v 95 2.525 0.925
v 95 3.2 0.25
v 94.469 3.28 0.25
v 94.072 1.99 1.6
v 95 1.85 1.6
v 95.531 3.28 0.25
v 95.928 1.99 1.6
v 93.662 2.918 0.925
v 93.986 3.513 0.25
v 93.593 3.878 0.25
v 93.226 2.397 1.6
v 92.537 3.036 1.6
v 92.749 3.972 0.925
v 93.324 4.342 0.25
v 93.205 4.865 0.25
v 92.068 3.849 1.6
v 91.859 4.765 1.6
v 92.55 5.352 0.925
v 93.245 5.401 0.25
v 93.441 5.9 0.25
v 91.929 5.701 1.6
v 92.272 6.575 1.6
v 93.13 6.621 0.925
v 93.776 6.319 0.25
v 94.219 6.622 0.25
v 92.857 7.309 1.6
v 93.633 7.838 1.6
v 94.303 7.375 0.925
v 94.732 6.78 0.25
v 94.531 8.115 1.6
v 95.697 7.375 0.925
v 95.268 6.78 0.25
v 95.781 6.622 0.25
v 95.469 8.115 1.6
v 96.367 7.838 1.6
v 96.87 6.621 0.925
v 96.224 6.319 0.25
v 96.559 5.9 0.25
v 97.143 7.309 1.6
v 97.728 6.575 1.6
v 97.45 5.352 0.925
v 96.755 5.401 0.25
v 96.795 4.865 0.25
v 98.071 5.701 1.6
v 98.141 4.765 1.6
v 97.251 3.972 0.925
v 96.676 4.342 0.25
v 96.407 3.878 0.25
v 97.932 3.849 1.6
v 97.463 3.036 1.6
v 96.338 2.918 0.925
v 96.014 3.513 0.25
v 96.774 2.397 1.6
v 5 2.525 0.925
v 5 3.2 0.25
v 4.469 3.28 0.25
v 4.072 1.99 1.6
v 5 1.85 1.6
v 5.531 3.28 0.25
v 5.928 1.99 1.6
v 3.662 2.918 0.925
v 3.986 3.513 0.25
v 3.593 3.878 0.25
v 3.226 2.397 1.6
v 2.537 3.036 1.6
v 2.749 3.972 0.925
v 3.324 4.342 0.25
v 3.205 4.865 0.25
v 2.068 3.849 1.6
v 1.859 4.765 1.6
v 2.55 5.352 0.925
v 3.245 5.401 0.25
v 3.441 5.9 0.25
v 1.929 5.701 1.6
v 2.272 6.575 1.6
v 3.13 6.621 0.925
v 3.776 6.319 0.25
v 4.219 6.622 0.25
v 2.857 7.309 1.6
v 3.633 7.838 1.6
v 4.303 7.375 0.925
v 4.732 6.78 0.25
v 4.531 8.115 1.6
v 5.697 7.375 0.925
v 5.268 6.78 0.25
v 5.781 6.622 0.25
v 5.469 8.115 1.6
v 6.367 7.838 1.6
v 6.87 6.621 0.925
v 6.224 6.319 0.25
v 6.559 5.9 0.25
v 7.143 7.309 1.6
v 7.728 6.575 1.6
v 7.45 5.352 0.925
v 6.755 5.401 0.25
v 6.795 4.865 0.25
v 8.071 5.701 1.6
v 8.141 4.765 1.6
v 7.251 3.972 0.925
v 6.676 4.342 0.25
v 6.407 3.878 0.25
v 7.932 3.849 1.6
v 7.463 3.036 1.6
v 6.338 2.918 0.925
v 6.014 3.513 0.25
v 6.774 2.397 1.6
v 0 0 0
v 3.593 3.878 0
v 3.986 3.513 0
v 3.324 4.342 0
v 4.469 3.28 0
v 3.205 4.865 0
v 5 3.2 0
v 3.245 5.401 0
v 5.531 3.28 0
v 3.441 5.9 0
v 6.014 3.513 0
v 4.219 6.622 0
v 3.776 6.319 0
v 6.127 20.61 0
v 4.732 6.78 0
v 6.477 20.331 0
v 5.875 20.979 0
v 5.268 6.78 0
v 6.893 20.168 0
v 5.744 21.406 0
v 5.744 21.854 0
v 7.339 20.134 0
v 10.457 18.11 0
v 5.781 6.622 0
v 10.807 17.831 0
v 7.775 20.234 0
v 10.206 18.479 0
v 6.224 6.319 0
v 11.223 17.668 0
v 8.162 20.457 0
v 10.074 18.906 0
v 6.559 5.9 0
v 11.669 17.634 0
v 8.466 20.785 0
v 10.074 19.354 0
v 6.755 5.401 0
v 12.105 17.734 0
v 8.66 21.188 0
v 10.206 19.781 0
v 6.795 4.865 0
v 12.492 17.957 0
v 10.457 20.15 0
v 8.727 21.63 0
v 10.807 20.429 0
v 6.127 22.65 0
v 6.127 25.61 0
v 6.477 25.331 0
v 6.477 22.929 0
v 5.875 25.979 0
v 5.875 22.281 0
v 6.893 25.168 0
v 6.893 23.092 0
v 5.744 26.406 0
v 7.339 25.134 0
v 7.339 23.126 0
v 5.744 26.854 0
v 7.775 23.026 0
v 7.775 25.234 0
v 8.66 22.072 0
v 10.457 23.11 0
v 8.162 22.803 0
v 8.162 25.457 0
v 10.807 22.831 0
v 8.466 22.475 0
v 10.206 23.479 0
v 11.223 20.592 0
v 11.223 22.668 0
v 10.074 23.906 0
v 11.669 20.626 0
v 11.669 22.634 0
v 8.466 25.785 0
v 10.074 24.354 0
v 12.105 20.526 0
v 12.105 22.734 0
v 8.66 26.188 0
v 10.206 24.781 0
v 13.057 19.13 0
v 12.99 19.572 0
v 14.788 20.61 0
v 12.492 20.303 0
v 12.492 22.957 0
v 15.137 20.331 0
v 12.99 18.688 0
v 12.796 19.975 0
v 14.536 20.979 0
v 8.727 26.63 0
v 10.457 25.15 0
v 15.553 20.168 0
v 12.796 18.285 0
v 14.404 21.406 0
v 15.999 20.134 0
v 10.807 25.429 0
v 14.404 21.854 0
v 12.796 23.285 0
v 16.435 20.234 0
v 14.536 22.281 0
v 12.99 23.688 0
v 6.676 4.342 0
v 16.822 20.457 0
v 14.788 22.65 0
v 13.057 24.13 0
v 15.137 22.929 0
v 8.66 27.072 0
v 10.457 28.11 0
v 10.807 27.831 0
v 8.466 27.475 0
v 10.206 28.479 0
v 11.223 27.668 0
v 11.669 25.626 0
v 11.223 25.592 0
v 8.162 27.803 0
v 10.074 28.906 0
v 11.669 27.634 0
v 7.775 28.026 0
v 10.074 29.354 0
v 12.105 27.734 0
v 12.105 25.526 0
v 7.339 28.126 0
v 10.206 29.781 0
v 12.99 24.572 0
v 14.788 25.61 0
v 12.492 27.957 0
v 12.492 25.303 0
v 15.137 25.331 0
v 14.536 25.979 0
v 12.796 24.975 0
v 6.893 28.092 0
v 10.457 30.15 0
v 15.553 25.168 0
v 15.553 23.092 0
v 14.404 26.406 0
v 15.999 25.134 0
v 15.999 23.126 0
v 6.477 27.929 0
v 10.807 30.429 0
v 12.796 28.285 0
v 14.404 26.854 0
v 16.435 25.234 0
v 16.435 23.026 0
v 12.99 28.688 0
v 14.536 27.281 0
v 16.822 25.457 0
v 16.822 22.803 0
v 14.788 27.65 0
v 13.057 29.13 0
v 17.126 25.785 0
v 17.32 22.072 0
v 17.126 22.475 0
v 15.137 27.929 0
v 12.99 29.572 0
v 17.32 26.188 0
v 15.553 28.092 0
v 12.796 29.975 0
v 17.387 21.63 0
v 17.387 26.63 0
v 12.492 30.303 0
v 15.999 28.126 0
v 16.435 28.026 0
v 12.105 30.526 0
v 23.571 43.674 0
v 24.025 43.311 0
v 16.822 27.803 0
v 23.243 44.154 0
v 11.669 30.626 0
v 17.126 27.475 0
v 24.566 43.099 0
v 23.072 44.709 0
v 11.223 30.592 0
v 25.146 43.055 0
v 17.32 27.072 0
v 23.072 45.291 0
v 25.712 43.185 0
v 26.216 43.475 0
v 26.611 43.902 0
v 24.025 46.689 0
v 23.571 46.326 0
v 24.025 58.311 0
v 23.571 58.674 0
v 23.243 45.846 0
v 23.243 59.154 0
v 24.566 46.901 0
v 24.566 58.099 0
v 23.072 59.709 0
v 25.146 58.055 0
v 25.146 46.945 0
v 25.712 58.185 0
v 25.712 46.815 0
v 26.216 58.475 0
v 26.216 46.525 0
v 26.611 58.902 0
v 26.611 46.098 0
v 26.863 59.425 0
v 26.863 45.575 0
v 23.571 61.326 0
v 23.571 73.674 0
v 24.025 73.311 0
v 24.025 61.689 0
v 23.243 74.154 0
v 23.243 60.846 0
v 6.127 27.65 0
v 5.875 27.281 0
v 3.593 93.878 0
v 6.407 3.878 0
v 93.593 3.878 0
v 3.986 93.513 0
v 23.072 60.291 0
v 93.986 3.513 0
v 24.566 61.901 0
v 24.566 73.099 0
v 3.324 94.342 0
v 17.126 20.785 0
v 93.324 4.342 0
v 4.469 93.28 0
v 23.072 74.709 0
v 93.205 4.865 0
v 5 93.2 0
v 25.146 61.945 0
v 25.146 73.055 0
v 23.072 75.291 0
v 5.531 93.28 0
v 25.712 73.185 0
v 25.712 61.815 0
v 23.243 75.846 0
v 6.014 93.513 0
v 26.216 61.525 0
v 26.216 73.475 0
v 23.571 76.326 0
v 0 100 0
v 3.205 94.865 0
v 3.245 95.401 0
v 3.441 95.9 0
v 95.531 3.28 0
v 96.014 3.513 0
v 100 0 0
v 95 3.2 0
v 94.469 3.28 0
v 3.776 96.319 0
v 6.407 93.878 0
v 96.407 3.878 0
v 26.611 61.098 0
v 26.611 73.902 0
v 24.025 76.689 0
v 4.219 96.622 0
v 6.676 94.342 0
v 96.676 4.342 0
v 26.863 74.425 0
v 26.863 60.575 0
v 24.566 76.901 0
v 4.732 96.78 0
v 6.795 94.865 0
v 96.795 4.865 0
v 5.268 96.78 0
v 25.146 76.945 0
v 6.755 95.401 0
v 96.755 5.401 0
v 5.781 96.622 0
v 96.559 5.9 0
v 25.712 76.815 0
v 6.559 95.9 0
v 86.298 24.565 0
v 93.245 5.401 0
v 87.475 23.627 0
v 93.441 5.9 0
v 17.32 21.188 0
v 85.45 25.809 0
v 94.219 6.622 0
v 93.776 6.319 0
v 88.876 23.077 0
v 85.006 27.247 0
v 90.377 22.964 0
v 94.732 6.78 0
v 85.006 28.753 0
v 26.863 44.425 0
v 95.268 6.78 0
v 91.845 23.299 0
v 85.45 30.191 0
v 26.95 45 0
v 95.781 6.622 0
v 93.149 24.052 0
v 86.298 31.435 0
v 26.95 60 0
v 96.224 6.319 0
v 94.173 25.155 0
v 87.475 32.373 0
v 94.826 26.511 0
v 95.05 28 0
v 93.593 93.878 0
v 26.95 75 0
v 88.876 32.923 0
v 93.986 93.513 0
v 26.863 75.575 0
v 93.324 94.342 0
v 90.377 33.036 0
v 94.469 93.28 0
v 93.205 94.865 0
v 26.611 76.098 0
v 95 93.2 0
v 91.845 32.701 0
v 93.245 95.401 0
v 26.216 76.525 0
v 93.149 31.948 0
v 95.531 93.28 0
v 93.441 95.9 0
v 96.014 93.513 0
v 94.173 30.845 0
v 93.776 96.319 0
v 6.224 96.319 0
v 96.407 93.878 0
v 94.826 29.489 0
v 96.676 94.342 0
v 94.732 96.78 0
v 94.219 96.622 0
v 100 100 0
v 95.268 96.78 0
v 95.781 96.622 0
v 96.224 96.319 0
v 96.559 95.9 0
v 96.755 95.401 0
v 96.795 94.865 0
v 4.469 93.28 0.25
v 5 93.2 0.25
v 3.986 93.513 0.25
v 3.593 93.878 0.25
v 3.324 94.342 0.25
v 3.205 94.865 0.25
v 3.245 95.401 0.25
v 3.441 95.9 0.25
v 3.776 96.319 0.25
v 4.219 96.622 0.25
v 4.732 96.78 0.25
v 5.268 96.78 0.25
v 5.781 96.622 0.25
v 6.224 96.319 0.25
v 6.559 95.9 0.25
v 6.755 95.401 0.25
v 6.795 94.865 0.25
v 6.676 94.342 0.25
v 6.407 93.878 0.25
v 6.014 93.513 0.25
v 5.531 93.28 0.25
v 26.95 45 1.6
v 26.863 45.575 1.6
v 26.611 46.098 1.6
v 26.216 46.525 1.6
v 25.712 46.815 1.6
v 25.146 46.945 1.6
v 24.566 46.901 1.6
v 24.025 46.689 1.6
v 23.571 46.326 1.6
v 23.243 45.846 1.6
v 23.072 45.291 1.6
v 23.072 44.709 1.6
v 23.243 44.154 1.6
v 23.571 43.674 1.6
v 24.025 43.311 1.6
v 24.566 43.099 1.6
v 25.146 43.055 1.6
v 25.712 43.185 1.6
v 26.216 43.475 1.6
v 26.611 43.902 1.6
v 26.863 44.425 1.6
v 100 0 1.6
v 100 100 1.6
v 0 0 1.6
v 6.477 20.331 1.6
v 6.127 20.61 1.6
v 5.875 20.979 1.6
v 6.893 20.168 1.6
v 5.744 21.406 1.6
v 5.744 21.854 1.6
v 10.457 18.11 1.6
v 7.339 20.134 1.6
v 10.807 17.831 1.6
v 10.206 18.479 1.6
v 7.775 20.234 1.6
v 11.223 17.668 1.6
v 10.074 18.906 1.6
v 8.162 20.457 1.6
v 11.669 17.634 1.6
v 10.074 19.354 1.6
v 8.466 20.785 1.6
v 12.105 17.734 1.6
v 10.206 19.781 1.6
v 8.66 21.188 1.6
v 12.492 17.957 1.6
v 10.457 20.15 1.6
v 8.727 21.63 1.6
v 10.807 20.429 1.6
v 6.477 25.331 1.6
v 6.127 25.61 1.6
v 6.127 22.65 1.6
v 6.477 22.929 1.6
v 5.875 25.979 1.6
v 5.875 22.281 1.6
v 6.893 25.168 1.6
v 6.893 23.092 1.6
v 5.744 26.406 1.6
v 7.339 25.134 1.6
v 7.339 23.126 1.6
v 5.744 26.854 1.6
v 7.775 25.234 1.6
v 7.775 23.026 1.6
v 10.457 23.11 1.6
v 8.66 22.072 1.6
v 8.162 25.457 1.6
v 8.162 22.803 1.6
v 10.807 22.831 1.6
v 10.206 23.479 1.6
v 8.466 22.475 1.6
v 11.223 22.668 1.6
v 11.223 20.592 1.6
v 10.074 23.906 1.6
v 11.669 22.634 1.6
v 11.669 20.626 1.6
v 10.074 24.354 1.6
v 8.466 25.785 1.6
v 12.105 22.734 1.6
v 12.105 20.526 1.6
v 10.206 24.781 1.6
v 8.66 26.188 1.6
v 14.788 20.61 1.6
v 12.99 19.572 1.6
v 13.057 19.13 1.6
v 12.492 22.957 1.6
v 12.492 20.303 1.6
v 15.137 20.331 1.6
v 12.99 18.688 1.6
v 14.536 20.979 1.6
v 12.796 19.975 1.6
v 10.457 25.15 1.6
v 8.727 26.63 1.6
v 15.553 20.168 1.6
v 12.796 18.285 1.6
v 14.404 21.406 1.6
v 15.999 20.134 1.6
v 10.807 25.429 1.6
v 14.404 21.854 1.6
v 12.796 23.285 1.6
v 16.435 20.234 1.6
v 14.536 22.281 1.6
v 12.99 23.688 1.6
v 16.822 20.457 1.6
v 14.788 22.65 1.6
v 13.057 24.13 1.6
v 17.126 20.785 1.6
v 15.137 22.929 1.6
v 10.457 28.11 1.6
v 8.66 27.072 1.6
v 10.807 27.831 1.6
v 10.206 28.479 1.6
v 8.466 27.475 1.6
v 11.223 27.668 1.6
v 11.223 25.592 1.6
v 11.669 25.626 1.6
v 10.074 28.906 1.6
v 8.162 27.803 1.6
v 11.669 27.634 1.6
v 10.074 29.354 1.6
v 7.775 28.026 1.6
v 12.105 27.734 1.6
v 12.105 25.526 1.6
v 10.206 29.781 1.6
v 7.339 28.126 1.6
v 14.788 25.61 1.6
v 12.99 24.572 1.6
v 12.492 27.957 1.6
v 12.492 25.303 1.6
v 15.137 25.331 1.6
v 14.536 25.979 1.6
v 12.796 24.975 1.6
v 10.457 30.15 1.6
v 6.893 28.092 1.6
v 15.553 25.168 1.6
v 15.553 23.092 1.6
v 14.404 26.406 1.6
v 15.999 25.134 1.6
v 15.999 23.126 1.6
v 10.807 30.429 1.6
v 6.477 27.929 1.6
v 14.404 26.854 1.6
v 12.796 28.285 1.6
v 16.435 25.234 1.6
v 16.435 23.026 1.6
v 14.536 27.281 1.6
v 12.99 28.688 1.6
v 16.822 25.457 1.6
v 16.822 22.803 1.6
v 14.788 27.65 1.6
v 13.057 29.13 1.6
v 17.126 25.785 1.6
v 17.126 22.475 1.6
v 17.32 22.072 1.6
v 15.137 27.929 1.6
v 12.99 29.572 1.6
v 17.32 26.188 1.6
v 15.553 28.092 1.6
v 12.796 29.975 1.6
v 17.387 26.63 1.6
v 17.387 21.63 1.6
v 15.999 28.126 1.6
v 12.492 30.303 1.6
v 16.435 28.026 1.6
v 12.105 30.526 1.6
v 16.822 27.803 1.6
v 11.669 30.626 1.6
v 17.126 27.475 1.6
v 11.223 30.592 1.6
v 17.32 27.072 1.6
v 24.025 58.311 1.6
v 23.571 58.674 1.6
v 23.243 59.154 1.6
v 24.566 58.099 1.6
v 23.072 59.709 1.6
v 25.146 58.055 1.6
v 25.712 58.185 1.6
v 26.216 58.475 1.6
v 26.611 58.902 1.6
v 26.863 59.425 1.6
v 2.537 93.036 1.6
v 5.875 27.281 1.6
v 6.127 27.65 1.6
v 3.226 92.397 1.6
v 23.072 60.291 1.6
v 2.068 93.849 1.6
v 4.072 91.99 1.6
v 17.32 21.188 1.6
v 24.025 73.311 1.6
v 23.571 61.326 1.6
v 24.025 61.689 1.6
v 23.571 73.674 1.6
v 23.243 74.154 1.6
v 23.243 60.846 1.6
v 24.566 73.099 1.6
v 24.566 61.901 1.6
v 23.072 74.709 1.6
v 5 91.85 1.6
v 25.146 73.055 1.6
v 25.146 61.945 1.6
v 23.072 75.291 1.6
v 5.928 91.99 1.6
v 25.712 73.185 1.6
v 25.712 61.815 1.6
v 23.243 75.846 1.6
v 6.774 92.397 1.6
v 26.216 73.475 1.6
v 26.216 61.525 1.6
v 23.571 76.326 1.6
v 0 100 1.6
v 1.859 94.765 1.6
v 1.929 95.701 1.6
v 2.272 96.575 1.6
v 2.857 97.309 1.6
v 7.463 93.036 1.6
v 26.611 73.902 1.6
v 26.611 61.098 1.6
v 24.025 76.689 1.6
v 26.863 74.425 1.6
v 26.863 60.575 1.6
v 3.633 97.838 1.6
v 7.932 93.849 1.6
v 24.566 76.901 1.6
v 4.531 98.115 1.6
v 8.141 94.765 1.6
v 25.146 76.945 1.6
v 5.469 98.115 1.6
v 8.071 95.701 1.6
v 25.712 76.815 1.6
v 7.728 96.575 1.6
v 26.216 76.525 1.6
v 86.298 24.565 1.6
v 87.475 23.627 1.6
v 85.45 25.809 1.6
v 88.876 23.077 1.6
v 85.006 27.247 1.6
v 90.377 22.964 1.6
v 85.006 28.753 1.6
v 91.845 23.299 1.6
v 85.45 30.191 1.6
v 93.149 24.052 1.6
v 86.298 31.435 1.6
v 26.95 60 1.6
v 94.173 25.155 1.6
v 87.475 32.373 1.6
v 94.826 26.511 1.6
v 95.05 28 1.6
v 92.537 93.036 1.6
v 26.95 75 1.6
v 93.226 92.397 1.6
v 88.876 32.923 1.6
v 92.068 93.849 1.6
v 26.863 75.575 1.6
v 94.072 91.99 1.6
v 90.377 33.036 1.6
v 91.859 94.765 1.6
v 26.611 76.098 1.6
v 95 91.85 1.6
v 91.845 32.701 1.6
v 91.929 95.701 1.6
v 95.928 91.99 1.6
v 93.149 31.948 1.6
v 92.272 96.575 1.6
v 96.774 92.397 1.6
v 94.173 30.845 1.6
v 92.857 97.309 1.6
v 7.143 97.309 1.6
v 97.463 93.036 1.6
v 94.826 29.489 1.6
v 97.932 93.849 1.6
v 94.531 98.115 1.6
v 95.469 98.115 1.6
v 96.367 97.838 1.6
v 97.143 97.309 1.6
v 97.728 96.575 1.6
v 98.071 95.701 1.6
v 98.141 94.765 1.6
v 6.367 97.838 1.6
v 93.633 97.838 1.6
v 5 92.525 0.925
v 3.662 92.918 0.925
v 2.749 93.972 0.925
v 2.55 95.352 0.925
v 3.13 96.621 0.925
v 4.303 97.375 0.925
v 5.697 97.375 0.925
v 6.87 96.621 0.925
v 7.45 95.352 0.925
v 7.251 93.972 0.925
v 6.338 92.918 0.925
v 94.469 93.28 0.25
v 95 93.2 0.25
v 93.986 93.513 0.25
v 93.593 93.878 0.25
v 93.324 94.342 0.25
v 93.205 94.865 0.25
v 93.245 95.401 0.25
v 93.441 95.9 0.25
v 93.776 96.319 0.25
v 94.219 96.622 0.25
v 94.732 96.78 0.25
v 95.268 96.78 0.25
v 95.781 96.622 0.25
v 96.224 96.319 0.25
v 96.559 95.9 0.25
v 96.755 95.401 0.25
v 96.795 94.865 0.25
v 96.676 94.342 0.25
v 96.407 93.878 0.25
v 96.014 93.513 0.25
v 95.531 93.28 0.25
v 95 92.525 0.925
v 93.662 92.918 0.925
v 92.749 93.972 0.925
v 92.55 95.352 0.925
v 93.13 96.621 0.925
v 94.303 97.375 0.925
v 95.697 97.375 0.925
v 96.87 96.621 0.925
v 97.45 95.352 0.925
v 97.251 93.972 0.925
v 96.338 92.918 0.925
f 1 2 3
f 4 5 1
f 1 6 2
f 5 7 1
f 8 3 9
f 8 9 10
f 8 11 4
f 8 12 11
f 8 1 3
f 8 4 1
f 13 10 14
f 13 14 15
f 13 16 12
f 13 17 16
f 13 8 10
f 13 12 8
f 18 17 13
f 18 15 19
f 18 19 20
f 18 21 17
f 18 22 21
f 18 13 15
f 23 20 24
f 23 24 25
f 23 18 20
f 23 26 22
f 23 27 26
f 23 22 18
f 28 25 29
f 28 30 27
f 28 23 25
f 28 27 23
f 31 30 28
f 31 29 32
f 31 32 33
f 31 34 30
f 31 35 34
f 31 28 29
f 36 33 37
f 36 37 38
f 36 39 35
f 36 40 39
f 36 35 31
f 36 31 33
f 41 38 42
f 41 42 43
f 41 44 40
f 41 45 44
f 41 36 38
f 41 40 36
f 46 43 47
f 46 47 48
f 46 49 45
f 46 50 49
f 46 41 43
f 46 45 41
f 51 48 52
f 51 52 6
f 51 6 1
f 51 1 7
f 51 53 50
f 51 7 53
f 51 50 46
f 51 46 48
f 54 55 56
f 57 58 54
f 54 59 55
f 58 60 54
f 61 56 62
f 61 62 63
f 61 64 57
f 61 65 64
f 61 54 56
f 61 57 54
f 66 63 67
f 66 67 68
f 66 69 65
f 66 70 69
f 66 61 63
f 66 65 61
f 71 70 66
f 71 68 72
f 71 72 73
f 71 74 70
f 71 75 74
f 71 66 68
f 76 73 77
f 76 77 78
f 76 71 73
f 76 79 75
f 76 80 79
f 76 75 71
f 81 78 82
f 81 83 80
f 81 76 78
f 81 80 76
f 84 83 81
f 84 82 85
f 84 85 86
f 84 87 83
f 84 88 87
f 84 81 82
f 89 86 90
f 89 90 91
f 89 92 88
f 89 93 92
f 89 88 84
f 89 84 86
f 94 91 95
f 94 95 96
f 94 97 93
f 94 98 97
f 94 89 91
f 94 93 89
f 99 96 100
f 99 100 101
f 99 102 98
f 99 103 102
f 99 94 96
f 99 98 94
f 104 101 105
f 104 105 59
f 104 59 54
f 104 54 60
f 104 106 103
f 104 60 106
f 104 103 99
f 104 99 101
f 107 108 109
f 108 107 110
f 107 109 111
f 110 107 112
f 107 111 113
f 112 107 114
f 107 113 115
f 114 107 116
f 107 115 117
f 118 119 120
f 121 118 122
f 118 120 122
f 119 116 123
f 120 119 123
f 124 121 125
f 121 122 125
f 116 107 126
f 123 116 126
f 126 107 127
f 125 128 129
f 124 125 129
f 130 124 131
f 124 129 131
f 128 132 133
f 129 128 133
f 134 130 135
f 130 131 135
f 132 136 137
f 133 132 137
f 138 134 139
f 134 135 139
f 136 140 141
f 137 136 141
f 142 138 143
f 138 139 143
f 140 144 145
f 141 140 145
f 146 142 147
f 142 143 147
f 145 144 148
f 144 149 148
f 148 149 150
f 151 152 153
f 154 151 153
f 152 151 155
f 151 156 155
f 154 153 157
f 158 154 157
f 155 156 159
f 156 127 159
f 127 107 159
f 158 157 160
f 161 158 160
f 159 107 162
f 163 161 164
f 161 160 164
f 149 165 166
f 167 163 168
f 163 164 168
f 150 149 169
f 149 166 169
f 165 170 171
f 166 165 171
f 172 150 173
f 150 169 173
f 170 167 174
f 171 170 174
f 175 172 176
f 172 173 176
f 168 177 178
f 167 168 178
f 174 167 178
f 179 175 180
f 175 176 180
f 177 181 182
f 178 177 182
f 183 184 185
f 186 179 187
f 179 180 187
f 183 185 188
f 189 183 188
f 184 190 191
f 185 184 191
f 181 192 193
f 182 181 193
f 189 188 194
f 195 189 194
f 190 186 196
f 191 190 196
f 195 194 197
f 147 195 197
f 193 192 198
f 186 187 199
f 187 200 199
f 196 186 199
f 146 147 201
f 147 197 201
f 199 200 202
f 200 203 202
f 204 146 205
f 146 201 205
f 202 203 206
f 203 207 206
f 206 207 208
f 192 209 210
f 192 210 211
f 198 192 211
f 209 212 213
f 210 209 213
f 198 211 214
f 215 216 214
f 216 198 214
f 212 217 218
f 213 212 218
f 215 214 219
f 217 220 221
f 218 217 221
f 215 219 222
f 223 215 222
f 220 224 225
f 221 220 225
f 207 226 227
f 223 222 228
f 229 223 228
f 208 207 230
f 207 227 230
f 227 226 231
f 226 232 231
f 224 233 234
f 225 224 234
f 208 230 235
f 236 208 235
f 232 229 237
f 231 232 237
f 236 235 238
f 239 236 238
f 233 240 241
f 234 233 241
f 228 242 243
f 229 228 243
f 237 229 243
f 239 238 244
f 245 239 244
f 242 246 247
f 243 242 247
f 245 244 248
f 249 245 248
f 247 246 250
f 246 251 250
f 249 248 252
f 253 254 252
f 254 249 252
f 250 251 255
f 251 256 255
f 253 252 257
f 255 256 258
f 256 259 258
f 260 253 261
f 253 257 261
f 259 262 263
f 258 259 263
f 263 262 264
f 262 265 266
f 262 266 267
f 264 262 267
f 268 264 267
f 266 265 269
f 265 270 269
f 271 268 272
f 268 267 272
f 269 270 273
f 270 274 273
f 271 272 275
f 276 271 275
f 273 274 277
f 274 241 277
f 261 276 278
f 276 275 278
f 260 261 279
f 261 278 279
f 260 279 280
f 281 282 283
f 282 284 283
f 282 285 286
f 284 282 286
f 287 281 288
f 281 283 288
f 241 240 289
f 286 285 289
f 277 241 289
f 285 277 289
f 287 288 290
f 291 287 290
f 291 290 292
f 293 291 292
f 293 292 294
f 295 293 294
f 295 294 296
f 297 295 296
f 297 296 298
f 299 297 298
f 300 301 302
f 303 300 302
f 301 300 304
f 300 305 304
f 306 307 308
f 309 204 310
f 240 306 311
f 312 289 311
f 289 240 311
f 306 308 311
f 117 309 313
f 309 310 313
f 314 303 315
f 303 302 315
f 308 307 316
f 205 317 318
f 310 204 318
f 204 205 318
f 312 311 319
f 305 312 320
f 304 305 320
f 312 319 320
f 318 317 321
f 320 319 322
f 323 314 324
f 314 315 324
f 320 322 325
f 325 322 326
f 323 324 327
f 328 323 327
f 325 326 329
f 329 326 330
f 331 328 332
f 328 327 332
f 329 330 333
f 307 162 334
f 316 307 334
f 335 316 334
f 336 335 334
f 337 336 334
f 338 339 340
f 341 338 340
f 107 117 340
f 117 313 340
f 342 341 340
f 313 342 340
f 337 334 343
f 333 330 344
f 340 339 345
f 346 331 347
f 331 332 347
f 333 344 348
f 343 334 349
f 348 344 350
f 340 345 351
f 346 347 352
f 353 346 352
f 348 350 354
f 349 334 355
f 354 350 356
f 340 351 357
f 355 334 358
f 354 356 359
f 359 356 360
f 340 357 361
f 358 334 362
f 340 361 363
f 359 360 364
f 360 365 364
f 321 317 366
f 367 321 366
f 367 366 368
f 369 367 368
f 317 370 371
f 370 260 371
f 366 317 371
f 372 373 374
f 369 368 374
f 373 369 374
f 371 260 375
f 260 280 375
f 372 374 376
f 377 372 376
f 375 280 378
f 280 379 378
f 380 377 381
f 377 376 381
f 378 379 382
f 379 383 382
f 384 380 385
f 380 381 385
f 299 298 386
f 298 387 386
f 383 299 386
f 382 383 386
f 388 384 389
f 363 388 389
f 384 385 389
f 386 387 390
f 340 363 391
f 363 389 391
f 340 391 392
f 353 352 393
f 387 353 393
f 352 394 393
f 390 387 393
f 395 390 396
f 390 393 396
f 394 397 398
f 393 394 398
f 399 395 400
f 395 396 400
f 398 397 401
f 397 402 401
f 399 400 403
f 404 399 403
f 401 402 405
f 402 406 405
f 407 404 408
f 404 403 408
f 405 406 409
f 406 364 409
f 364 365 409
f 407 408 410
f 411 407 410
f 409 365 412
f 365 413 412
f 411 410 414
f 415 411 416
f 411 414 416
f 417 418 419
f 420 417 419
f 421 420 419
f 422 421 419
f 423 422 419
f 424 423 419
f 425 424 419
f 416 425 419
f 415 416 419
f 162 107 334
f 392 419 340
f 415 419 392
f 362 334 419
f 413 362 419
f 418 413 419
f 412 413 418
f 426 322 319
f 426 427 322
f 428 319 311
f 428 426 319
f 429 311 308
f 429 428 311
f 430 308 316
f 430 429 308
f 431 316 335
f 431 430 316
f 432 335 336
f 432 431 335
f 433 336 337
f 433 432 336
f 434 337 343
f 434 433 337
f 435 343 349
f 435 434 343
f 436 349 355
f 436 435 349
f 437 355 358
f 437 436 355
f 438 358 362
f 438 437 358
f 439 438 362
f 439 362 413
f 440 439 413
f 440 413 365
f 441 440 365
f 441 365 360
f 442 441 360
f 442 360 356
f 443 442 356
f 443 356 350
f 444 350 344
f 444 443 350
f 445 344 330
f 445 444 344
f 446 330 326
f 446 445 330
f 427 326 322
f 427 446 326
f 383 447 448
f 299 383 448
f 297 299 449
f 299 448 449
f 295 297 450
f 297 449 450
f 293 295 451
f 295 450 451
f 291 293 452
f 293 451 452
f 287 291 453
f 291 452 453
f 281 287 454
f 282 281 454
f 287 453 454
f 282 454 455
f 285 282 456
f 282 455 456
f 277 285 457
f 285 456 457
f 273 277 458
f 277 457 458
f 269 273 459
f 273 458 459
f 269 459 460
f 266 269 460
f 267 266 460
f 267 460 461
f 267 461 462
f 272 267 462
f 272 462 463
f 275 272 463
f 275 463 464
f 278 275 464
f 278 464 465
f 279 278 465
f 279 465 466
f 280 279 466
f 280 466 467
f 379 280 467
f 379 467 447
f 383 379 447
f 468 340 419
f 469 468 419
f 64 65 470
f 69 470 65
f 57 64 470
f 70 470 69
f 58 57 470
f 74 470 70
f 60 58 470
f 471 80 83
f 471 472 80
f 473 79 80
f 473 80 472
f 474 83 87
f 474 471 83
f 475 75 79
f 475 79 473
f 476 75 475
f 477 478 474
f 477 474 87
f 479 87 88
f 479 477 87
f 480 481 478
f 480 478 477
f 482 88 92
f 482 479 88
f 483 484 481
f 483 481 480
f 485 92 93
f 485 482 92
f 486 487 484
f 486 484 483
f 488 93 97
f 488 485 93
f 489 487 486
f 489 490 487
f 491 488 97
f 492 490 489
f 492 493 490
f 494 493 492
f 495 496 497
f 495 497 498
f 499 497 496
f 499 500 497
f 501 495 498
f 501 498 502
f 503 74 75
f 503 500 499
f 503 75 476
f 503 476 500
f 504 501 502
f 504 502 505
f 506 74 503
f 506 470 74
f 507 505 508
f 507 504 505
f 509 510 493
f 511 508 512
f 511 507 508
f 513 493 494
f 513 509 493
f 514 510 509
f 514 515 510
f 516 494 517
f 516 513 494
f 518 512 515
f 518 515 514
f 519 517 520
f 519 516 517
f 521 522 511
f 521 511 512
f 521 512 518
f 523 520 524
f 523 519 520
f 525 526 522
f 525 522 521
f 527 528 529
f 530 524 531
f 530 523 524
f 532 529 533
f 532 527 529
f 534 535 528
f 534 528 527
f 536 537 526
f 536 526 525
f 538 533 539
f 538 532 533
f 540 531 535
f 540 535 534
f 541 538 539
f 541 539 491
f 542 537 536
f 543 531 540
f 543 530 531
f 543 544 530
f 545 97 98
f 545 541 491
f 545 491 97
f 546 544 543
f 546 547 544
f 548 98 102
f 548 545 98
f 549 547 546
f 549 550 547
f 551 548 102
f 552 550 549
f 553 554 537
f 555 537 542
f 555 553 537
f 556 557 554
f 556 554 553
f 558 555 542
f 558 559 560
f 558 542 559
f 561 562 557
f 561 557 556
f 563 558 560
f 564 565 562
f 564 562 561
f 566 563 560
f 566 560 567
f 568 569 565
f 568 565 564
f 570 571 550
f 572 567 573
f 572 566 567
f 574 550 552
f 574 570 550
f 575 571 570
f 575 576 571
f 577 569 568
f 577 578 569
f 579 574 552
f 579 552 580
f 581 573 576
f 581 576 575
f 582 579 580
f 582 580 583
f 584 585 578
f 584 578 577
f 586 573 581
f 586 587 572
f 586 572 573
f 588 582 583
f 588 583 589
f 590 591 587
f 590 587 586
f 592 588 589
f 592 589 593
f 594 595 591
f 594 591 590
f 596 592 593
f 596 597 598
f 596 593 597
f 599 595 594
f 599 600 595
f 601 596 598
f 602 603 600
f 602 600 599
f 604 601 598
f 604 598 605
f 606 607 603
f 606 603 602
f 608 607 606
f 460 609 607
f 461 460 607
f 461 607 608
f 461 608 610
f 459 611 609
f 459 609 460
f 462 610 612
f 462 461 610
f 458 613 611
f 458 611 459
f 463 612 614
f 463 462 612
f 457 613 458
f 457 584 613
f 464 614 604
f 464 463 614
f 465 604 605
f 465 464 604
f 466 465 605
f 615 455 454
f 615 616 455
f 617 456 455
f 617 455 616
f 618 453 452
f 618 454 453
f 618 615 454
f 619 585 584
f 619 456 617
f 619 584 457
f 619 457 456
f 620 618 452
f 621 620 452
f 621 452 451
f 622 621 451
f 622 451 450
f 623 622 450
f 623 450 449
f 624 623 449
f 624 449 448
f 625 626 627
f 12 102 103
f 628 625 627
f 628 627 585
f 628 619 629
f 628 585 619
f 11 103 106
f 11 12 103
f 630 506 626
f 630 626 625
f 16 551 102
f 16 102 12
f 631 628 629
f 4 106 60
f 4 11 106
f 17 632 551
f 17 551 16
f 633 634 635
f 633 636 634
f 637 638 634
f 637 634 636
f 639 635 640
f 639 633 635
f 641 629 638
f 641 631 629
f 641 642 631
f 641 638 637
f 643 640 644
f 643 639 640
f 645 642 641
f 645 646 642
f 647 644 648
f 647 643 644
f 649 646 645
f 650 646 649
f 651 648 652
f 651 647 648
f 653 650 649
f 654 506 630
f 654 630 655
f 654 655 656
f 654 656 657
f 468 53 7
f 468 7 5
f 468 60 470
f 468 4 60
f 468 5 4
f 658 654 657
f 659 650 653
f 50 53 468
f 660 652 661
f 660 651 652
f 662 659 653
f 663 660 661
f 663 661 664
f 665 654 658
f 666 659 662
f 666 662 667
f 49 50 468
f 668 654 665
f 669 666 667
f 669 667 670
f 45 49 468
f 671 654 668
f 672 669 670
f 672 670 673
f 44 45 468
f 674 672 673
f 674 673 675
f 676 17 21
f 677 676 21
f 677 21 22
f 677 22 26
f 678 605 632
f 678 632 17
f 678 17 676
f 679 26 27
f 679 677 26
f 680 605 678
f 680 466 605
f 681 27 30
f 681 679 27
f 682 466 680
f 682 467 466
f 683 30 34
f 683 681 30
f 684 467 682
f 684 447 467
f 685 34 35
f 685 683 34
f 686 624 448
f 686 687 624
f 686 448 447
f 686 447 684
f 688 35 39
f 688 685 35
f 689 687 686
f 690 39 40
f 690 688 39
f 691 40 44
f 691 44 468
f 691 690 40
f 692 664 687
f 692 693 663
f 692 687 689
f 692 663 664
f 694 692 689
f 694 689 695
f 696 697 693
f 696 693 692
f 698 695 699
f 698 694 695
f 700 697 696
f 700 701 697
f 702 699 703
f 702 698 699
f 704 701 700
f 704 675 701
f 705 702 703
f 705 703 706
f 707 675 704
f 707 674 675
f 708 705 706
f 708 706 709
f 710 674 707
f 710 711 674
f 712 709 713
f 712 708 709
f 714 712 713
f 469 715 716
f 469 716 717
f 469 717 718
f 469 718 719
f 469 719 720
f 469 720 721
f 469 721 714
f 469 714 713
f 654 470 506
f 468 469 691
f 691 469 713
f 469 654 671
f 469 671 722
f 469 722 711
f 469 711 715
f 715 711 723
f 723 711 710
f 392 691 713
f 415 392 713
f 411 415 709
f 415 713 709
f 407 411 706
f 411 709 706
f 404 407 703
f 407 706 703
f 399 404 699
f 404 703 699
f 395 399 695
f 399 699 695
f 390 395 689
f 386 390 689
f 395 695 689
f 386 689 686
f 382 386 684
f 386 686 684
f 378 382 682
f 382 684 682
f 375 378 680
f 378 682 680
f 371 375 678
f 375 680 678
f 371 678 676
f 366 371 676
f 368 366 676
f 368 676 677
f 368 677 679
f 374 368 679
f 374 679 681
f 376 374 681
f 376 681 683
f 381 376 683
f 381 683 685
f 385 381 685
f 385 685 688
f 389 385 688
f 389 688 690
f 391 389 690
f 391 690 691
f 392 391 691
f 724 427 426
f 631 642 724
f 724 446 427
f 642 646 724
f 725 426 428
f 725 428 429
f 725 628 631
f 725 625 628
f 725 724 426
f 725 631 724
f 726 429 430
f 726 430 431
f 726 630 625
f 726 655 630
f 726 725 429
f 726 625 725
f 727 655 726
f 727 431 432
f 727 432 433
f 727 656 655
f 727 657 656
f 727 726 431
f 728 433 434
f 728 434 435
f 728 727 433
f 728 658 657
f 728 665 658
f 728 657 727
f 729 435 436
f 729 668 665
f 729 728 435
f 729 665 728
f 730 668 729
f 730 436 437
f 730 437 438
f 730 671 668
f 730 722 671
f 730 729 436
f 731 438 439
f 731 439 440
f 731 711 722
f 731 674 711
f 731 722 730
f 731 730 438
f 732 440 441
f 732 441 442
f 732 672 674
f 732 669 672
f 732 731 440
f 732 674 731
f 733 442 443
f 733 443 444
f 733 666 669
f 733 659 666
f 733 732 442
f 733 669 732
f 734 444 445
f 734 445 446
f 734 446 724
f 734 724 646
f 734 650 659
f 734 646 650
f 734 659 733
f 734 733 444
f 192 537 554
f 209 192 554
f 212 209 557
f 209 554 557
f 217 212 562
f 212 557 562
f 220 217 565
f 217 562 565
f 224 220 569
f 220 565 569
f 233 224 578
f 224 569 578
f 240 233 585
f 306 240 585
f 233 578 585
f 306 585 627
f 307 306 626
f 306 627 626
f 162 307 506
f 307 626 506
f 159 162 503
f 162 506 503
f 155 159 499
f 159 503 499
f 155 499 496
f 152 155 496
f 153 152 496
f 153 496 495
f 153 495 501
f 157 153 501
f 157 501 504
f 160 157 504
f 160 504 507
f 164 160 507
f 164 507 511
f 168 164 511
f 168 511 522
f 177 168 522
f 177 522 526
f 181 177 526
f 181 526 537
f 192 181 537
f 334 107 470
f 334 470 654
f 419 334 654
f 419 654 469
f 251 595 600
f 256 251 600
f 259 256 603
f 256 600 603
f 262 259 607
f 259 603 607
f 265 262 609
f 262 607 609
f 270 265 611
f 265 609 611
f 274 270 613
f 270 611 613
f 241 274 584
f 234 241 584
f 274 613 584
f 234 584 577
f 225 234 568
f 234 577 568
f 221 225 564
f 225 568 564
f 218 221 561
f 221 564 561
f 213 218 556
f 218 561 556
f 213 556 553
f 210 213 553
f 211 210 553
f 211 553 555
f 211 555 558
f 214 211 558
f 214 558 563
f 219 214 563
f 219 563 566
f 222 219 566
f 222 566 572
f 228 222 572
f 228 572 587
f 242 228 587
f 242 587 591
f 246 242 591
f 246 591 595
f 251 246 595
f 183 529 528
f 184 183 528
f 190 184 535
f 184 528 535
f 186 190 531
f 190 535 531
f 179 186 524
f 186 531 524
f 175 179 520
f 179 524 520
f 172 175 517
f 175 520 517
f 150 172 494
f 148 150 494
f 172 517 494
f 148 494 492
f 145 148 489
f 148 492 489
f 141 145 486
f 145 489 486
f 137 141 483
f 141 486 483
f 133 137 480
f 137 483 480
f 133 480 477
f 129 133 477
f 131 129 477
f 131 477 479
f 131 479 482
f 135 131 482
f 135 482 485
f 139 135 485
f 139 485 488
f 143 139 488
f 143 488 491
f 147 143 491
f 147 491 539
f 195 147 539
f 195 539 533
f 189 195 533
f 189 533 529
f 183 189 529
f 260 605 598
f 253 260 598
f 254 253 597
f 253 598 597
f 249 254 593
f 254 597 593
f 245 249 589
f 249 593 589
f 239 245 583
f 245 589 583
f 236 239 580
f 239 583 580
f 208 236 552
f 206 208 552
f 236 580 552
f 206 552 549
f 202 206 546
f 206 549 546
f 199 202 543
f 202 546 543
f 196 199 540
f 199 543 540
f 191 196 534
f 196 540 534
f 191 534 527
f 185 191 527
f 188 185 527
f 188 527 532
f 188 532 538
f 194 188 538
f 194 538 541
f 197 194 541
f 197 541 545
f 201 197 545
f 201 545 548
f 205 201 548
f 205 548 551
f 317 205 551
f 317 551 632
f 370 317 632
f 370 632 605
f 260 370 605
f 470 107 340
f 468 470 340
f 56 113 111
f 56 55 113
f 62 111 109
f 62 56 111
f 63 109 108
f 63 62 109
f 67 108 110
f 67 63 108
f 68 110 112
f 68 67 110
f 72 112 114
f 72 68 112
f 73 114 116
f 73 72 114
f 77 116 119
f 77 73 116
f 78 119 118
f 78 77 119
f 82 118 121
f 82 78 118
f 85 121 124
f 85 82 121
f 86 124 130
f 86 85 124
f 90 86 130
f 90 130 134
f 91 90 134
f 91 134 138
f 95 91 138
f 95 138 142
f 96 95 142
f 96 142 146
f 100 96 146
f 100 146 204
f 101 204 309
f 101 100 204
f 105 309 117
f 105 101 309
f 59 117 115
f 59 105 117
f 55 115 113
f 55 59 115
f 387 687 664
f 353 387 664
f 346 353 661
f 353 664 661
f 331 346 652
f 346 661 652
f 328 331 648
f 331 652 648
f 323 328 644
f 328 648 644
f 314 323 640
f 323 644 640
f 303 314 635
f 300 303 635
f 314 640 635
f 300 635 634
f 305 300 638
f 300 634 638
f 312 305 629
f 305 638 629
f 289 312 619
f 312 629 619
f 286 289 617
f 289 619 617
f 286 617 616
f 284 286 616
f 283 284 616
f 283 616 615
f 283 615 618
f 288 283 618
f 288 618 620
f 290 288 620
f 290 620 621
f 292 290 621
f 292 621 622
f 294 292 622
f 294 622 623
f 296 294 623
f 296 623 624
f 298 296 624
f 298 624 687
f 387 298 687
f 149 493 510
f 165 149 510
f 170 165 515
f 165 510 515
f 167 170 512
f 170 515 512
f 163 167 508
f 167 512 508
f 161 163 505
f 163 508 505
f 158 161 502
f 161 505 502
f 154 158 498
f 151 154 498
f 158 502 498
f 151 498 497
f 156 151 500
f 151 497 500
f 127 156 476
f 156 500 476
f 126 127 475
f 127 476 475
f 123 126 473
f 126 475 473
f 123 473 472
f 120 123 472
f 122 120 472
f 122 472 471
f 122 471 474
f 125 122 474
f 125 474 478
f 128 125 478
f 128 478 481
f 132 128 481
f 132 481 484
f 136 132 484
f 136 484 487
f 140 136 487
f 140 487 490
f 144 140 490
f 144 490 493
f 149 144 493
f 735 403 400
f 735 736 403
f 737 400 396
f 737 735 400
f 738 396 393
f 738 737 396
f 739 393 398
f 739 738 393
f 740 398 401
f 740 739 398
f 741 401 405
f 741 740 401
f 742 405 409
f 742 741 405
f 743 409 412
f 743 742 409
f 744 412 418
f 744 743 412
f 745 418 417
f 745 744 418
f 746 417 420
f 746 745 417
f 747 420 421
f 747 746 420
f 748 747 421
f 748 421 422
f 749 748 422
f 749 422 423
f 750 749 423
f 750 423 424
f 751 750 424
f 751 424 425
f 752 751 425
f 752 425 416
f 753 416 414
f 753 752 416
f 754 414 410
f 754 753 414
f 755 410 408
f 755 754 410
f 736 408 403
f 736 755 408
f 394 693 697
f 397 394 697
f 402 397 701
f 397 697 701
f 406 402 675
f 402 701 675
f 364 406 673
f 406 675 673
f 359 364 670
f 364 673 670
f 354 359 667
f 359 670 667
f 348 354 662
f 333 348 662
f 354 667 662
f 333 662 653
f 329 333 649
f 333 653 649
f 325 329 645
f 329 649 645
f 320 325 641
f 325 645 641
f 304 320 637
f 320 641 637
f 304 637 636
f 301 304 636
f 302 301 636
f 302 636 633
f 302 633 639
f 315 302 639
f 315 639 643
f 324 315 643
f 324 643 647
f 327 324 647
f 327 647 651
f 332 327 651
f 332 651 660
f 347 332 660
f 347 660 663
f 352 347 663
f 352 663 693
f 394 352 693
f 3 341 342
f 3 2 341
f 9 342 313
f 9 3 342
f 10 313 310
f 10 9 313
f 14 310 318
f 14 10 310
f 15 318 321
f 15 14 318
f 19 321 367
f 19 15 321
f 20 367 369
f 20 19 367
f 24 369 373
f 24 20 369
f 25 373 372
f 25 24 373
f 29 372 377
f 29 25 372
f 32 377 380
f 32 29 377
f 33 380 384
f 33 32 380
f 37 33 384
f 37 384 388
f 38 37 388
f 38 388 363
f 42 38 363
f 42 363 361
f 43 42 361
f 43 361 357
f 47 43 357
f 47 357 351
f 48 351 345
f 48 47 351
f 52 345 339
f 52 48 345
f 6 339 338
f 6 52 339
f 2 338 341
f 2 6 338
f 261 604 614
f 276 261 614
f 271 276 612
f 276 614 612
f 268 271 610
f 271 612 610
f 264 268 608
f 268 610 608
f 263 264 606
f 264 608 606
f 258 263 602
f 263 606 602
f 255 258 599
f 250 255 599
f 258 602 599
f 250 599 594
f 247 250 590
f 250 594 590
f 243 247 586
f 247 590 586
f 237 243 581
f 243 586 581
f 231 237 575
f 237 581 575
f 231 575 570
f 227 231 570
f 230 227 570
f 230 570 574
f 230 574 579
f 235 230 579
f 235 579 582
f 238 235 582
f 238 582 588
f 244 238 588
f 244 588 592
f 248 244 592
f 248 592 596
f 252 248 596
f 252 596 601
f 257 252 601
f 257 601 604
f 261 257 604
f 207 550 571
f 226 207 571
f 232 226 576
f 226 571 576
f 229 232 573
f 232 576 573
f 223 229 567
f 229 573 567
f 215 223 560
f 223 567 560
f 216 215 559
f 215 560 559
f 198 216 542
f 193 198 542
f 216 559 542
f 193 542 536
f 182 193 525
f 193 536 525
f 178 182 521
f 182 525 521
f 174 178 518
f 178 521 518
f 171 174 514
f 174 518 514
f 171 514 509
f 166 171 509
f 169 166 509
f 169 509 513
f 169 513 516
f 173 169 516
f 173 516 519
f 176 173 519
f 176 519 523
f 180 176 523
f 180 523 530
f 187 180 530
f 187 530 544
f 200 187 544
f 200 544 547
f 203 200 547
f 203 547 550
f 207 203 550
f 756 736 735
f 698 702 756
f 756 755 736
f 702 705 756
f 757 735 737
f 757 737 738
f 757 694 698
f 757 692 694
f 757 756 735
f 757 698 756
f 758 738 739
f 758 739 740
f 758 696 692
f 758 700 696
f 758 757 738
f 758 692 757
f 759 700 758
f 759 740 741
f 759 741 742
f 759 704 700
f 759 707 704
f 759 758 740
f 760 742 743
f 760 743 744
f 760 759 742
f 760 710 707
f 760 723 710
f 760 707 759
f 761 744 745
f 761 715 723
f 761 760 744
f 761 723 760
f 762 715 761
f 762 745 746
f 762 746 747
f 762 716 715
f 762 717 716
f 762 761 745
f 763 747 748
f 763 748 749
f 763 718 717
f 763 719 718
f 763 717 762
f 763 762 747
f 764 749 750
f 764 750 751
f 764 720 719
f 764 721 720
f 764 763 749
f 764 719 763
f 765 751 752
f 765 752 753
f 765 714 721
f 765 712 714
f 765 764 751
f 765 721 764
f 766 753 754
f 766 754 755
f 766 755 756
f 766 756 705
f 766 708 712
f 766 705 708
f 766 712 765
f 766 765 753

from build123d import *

# Parameters (mm, degrees)
ESQUISSE1_W                                 = 100
ESQUISSE1_H                                 = 100
BOSS_EXTRU_1_DEPTH                          = 1.6
FRAISAGE_POUR_VIS_T_TE_FRAIS_E_M31_AT_COUNT = 2
FRAISAGE_POUR_VIS_T_TE_FRAIS_E_M31_AT_PITCH = 90
FRAISAGE_POUR_VIS_T_TE_FRAIS_E_M31_2_COUNT  = 2
FRAISAGE_POUR_VIS_T_TE_FRAIS_E_M31_2_PITCH  = 127.279220614
FRAISAGE_POUR_VIS_T_TE_FRAIS_E_M31_3_COUNT  = 2
FRAISAGE_POUR_VIS_T_TE_FRAIS_E_M31_3_PITCH  = 90
ESQUISSE4_R                                 = 5.05
ESQUISSE4_R_2                               = 1.5
ESQUISSE4_R_3                               = 1.95
ENL_V_MAT_EXTRU_1_DEPTH                     = 2.6


with BuildPart() as part:
    # Esquisse1 → Boss.-Extru.1 (new body)
    with BuildSketch(Plane.XY):
        with Locations((50, 50)):
            Rectangle(ESQUISSE1_W, ESQUISSE1_H)
    extrude(amount=BOSS_EXTRU_1_DEPTH)

    # Esquisse3 → Fraisage pour vis à tête fraisée M31 (revolve, cut)
    with BuildSketch(Plane(origin=(5, 95, 1.6), x_dir=(0, -1, 0), z_dir=(1, 0, 0))):
        Polygon((0, 0), (0, 1.6), (1.8, 1.6), (1.8, 1.35), (3.15, 0), align=None)
    fraisage_pour_vis_t_te_frais_e_m31 = revolve(axis=Axis((5, 95, 7.95), (0, 0, -1)), mode=Mode.SUBTRACT)

    # Fraisage pour vis à tête fraisée M31 at: Fraisage pour vis à tête fraisée M31 ×2
    with Locations(*[(i * FRAISAGE_POUR_VIS_T_TE_FRAIS_E_M31_AT_PITCH, 0, 0) for i in range(1, FRAISAGE_POUR_VIS_T_TE_FRAIS_E_M31_AT_COUNT)]):
        add(fraisage_pour_vis_t_te_frais_e_m31, mode=Mode.SUBTRACT)

    # Fraisage pour vis _ t_te frais_e M31 2: Fraisage pour vis à tête fraisée M31 ×2
    with Locations(*[Vector(0.707106781, -0.707106781, 0) * (i * FRAISAGE_POUR_VIS_T_TE_FRAIS_E_M31_2_PITCH) for i in range(1, FRAISAGE_POUR_VIS_T_TE_FRAIS_E_M31_2_COUNT)]):
        add(fraisage_pour_vis_t_te_frais_e_m31, mode=Mode.SUBTRACT)

    # Fraisage pour vis _ t_te frais_e M31 3: Fraisage pour vis à tête fraisée M31 ×2
    with Locations(*[(0, -i * FRAISAGE_POUR_VIS_T_TE_FRAIS_E_M31_3_PITCH, 0) for i in range(1, FRAISAGE_POUR_VIS_T_TE_FRAIS_E_M31_3_COUNT)]):
        add(fraisage_pour_vis_t_te_frais_e_m31, mode=Mode.SUBTRACT)

    # Esquisse4 → Enlèv. mat.-Extru.1 (cut, through all)
    with BuildSketch(Plane.XY.offset(1.6)):
        with Locations((90, 28)):
            Circle(ESQUISSE4_R)
        with Locations((11.557, 24.13)):
            Circle(ESQUISSE4_R_2)
        with Locations((11.557, 29.13)):
            Circle(ESQUISSE4_R_2)
        with Locations((15.887127019, 26.63)):
            Circle(ESQUISSE4_R_2)
        with Locations((15.887127019, 21.63)):
            Circle(ESQUISSE4_R_2)
        with Locations((11.557, 19.13)):
            Circle(ESQUISSE4_R_2)
        with Locations((7.226872981, 21.63)):
            Circle(ESQUISSE4_R_2)
        with Locations((7.226872981, 26.63)):
            Circle(ESQUISSE4_R_2)
        with Locations((25, 75)):
            Circle(ESQUISSE4_R_3)
        with Locations((25, 60)):
            Circle(ESQUISSE4_R_3)
        with Locations((25, 45)):
            Circle(ESQUISSE4_R_3)
    extrude(amount=-ENL_V_MAT_EXTRU_1_DEPTH, mode=Mode.SUBTRACT)


solid = part.part
